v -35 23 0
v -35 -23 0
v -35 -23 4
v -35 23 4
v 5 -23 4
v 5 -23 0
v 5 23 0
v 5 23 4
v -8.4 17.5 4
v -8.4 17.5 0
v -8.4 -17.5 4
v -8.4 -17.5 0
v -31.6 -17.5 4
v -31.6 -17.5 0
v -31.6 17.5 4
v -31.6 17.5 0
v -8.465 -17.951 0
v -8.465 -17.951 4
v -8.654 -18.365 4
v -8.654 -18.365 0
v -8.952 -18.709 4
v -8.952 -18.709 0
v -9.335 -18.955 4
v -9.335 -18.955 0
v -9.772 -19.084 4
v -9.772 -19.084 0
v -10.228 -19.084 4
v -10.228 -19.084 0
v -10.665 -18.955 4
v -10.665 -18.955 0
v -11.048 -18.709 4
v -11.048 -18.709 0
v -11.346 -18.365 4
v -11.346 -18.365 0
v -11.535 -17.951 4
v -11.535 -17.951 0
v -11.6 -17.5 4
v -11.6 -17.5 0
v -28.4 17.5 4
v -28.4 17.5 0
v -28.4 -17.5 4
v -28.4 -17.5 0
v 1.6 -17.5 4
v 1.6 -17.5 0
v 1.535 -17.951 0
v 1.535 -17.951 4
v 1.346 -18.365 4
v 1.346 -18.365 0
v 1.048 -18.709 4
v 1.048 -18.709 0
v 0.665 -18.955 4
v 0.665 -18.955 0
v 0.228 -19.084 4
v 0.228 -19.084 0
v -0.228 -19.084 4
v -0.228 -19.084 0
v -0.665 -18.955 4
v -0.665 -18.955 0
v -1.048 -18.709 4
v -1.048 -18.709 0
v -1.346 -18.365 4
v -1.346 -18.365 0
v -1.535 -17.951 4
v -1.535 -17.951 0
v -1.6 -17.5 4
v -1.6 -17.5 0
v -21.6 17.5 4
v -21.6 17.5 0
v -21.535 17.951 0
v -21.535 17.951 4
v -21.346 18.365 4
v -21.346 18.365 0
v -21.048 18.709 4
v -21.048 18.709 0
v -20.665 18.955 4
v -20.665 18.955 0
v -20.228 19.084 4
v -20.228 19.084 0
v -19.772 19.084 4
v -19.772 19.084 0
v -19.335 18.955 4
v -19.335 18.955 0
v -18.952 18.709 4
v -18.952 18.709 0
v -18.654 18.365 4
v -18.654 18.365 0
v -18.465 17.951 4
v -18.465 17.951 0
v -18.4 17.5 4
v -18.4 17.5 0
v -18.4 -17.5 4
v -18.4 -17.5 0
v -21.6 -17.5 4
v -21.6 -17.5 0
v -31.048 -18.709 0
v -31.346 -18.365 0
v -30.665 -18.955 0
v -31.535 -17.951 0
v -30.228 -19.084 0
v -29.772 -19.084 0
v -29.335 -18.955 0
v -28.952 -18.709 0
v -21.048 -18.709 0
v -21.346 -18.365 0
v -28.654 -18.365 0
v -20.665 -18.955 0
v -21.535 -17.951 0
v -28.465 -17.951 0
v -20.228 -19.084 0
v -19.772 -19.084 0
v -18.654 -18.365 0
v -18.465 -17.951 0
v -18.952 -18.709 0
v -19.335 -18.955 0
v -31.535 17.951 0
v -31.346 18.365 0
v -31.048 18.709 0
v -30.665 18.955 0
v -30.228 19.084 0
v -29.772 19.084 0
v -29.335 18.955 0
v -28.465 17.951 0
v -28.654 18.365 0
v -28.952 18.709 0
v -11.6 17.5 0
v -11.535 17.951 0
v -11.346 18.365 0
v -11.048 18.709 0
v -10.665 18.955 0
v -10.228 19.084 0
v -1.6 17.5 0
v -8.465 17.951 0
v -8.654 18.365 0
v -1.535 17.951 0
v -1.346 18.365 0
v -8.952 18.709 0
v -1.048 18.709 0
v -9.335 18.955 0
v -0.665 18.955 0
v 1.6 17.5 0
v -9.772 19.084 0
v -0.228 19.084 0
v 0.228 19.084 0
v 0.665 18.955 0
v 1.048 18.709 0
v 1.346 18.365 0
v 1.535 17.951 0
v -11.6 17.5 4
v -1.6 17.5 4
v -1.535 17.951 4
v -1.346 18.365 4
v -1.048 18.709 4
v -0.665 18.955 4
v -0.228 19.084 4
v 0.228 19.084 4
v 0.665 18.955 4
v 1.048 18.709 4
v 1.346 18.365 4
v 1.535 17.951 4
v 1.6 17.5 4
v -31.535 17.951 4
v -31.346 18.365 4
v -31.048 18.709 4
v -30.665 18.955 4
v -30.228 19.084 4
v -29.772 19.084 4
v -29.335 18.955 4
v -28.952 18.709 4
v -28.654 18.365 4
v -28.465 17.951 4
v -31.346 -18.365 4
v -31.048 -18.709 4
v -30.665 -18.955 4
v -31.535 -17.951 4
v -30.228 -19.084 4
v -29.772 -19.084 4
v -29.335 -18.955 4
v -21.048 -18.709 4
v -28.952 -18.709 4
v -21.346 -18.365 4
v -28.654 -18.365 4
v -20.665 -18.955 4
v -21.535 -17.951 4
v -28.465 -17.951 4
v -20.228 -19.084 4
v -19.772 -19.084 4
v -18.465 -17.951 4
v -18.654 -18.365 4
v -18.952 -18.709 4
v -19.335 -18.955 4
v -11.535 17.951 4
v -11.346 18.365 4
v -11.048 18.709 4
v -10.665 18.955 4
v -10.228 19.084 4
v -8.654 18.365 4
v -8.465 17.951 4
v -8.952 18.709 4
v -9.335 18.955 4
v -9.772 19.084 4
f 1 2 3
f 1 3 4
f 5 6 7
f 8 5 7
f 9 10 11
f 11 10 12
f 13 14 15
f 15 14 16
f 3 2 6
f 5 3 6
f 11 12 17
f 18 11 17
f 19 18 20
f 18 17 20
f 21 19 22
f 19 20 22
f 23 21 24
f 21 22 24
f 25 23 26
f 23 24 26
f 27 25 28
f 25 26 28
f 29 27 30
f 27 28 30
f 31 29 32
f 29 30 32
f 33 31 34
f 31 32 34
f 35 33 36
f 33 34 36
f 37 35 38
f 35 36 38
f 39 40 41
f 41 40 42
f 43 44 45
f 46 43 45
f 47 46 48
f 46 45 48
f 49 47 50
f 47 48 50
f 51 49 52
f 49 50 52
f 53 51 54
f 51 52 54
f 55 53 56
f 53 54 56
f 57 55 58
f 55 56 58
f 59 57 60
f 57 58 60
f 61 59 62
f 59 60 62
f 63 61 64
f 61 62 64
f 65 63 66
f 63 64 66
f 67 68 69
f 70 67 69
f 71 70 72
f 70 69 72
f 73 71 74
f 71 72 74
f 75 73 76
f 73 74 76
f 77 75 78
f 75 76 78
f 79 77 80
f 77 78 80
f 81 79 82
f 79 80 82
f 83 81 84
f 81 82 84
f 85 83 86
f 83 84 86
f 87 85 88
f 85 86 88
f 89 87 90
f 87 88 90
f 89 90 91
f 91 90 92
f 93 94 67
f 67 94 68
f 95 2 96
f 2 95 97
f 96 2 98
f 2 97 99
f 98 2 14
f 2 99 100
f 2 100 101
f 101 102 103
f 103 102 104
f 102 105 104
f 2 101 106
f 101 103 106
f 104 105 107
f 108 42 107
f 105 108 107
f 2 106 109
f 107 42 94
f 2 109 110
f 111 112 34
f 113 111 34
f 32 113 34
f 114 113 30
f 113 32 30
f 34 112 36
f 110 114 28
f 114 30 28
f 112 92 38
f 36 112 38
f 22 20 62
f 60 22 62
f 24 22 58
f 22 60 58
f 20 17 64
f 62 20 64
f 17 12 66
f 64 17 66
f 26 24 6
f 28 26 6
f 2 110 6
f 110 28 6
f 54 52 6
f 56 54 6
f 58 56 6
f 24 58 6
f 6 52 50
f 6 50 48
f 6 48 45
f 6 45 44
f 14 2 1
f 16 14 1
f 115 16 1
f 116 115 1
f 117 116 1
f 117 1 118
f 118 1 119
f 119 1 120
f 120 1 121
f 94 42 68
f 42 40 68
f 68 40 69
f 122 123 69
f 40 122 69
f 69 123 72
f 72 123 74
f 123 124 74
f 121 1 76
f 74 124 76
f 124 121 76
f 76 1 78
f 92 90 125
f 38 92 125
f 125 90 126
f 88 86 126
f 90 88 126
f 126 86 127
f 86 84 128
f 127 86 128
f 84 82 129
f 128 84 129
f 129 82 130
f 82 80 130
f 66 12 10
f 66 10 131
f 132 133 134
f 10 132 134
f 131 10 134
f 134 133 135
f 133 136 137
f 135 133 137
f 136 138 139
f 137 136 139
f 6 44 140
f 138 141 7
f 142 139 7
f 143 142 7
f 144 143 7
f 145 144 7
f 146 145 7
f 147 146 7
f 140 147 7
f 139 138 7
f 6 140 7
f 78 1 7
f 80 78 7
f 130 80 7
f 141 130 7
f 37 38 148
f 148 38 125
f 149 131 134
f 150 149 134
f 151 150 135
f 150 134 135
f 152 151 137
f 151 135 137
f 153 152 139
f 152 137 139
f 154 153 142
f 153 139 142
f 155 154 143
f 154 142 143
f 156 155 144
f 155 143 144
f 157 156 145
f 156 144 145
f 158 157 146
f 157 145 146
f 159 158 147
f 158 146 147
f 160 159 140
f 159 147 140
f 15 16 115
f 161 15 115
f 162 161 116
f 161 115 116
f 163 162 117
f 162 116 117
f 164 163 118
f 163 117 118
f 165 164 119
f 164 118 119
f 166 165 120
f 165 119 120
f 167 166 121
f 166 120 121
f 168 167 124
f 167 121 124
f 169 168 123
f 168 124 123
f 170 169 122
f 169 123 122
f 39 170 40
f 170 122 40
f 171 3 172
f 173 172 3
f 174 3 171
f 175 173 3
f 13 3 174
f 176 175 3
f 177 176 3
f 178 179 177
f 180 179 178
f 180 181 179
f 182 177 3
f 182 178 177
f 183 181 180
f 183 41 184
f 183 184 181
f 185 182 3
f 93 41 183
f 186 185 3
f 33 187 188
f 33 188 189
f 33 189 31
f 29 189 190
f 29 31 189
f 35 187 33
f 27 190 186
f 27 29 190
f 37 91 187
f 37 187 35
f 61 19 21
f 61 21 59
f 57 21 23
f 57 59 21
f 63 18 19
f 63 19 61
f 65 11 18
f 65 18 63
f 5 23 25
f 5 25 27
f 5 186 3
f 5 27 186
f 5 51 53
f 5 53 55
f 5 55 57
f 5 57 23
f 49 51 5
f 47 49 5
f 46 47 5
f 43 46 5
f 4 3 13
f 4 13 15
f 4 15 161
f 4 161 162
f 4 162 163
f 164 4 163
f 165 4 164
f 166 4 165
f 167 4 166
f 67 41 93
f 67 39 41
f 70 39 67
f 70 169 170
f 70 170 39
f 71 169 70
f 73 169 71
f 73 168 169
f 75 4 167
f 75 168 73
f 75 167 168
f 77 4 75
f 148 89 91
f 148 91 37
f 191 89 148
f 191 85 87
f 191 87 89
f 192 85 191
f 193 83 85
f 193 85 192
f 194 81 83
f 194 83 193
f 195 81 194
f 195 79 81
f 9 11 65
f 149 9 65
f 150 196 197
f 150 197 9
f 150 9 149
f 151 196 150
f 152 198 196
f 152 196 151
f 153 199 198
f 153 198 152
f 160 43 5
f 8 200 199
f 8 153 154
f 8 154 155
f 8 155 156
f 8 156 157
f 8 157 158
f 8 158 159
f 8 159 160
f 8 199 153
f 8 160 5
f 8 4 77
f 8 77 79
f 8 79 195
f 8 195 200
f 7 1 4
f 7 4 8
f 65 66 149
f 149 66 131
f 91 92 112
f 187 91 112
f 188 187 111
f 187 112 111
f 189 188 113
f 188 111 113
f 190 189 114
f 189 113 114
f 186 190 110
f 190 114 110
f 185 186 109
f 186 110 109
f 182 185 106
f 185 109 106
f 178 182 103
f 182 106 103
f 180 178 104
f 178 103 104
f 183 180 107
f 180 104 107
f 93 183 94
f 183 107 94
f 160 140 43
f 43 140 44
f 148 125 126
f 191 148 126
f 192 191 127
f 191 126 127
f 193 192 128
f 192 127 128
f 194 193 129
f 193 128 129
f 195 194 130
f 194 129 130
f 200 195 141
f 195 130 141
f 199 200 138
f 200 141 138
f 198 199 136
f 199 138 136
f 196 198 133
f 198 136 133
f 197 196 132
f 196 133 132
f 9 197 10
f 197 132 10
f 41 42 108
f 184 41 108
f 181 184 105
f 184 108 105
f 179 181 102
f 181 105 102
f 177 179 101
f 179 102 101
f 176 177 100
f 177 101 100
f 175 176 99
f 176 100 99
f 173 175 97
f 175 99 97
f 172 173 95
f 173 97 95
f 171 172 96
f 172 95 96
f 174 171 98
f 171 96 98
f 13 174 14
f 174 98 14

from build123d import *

# Parameters (mm, degrees)
SKETCH1_W           = 10
SKETCH1_H           = 46
BOSS_EXTRUDE1_DEPTH = 4
LPATTERN2_COUNT     = 4
LPATTERN2_PITCH     = 10


with BuildPart() as part:
    # Sketch1 → Boss-Extrude1 (new body)
    with BuildSketch(Plane.XY):
        Rectangle(SKETCH1_W, SKETCH1_H)
        with BuildLine():
            Line((1.6, 17.5), (1.6, -17.5))
            ThreePointArc((1.6, -17.5), (0, -19.1), (-1.6, -17.5))
            Line((-1.6, -17.5), (-1.6, 17.5))
            ThreePointArc((-1.6, 17.5), (0, 19.1), (1.6, 17.5))
        make_face(mode=Mode.SUBTRACT)
    boss_extrude1 = extrude(amount=BOSS_EXTRUDE1_DEPTH)

    # LPattern2: Boss-Extrude1 ×4
    with Locations(*[(-i * LPATTERN2_PITCH, 0, 0) for i in range(1, LPATTERN2_COUNT)]):
        add(boss_extrude1)


solid = part.part
